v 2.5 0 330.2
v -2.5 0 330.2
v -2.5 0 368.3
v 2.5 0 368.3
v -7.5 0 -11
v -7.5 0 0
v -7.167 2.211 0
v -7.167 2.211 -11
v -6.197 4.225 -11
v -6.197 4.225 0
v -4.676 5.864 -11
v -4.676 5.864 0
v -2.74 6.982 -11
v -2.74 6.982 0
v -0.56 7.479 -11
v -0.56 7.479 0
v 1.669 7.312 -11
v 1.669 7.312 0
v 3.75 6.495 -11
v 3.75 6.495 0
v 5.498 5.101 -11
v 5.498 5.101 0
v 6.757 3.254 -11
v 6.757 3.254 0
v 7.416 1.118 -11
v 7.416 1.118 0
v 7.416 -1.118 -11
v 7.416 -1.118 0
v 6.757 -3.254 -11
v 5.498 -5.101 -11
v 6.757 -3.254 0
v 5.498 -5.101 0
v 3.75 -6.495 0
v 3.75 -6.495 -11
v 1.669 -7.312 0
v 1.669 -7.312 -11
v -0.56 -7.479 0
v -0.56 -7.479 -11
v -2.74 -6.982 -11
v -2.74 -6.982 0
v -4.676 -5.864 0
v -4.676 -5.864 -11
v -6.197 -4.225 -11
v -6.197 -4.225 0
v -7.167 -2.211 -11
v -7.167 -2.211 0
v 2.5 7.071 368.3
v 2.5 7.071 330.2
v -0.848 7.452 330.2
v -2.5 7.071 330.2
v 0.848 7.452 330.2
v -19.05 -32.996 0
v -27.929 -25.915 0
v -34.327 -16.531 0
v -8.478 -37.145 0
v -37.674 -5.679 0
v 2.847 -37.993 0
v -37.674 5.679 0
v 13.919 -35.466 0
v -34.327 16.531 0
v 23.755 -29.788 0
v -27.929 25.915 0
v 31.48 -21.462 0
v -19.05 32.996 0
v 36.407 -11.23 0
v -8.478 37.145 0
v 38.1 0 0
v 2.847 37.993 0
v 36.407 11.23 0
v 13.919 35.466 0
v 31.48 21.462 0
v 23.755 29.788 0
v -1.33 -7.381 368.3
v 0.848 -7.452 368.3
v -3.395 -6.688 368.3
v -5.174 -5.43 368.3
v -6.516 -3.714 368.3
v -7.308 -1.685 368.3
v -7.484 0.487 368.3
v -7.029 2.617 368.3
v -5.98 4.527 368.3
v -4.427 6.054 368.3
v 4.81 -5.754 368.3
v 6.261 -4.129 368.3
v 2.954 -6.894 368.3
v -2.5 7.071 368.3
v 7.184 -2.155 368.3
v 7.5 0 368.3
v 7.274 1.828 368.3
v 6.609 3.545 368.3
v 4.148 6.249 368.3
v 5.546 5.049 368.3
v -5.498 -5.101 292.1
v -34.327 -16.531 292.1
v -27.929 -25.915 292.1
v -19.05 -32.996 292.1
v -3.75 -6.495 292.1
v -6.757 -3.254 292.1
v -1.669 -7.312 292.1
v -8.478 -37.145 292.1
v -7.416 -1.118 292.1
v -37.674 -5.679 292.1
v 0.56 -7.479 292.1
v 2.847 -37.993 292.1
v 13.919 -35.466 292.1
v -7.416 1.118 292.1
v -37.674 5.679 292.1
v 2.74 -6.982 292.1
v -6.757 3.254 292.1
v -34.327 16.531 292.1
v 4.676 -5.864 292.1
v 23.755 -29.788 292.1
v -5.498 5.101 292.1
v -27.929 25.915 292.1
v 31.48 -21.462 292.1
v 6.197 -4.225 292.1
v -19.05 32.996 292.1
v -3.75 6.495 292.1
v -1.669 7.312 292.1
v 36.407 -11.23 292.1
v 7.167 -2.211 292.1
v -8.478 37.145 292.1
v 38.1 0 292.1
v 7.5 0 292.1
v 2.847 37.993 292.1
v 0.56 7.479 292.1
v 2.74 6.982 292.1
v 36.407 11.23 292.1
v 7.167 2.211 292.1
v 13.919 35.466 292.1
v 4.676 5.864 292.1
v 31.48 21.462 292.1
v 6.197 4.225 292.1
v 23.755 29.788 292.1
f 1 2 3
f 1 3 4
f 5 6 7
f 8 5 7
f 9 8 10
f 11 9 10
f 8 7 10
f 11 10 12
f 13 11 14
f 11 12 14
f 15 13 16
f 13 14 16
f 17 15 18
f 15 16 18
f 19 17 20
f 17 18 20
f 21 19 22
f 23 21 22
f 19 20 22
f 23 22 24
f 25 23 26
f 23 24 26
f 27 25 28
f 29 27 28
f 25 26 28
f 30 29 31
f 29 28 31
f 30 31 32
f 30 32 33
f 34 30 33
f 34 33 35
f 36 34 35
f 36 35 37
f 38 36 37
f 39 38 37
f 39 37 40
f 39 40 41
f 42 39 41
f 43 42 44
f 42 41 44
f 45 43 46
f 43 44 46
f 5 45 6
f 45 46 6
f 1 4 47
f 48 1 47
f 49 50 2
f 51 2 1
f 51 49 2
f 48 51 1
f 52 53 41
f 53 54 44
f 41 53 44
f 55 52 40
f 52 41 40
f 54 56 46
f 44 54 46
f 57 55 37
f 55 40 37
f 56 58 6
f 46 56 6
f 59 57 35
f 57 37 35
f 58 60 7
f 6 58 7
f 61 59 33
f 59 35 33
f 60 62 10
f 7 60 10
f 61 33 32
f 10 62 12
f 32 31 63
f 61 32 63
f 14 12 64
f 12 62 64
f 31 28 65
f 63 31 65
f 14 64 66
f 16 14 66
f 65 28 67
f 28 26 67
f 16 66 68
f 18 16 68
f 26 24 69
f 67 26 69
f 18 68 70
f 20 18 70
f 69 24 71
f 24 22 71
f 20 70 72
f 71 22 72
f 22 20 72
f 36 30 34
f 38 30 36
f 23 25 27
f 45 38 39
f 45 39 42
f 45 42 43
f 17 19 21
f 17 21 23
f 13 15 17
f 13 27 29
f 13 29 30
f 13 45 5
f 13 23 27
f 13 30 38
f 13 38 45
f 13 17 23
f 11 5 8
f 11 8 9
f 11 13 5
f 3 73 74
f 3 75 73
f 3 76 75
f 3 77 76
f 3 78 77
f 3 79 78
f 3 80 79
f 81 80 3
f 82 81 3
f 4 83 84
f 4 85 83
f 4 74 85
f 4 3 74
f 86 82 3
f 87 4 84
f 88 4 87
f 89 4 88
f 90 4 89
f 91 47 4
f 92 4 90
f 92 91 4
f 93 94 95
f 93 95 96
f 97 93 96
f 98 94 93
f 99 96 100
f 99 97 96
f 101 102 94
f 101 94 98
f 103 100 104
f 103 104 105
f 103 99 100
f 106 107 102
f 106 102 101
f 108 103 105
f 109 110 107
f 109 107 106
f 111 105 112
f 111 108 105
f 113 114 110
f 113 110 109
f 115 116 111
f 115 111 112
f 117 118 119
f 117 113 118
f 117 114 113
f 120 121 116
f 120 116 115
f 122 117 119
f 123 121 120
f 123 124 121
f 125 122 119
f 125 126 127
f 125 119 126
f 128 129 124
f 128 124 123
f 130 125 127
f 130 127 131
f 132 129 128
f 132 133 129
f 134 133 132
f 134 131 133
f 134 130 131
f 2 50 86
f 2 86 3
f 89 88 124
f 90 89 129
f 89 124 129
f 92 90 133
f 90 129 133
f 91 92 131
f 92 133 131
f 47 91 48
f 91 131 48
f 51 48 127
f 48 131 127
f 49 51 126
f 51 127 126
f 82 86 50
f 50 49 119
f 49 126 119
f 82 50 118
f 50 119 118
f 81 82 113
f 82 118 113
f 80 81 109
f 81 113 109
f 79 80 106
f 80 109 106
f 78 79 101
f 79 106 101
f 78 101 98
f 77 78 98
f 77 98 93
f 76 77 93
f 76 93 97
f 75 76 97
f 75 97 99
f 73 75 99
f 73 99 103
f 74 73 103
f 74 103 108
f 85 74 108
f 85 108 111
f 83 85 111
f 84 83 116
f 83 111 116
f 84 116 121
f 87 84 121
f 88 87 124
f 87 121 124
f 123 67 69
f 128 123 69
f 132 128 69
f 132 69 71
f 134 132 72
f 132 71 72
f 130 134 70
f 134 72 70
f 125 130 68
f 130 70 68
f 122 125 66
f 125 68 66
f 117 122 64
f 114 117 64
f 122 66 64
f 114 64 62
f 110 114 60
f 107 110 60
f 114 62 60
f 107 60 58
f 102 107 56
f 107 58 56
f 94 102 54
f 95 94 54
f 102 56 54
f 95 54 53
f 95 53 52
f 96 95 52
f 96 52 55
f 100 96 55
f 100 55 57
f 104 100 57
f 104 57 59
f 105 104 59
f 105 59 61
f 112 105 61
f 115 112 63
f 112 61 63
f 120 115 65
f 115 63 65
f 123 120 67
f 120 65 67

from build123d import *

# Parameters (mm, degrees)
SKETCH1_R               = 38.1
BOSS_EXTRUDE1_DEPTH     = 292.1
SKETCH3_R               = 7.5
BOSS_EXTRUDE2_DEPTH     = 76.2
CUT_EXTRUDE1_DEPTH      = 1
CUT_EXTRUDE1_DEPTH_BACK = 38.1
SKETCH5_R               = 7.5
BOSS_EXTRUDE3_DEPTH     = 11


with BuildPart() as part:
    # Sketch1 → Boss-Extrude1 (new body)
    with BuildSketch(Plane.XY):
        Circle(SKETCH1_R)
    extrude(amount=BOSS_EXTRUDE1_DEPTH)

    # Sketch3 → Boss-Extrude2 (add)
    with BuildSketch(Plane.XY.offset(292.1)):
        Circle(SKETCH3_R)
    extrude(amount=BOSS_EXTRUDE2_DEPTH)

    # Sketch4 → Cut-Extrude1 (cut, two sides)
    with BuildSketch(Plane.XY.offset(368.3)) as cut_extrude1_sk:
        Polygon((-2.5, 138.541811076), (-2.5, 7.071067812), (-2.5, 0), (2.5, 0), (2.5, 7.071067812), (2.5, 138.541811076), (2.5, 401.483297603), (-2.5, 401.483297603), align=None)
    extrude(amount=CUT_EXTRUDE1_DEPTH, mode=Mode.SUBTRACT)
    extrude(cut_extrude1_sk.sketch, amount=-CUT_EXTRUDE1_DEPTH_BACK, mode=Mode.SUBTRACT)

    # Sketch5 → Boss-Extrude3 (add)
    with BuildSketch(Plane(origin=(0, 0, 0), x_dir=(-1, 0, 0), z_dir=(0, 0, -1))):
        Circle(SKETCH5_R)
    extrude(amount=BOSS_EXTRUDE3_DEPTH)


solid = part.part
